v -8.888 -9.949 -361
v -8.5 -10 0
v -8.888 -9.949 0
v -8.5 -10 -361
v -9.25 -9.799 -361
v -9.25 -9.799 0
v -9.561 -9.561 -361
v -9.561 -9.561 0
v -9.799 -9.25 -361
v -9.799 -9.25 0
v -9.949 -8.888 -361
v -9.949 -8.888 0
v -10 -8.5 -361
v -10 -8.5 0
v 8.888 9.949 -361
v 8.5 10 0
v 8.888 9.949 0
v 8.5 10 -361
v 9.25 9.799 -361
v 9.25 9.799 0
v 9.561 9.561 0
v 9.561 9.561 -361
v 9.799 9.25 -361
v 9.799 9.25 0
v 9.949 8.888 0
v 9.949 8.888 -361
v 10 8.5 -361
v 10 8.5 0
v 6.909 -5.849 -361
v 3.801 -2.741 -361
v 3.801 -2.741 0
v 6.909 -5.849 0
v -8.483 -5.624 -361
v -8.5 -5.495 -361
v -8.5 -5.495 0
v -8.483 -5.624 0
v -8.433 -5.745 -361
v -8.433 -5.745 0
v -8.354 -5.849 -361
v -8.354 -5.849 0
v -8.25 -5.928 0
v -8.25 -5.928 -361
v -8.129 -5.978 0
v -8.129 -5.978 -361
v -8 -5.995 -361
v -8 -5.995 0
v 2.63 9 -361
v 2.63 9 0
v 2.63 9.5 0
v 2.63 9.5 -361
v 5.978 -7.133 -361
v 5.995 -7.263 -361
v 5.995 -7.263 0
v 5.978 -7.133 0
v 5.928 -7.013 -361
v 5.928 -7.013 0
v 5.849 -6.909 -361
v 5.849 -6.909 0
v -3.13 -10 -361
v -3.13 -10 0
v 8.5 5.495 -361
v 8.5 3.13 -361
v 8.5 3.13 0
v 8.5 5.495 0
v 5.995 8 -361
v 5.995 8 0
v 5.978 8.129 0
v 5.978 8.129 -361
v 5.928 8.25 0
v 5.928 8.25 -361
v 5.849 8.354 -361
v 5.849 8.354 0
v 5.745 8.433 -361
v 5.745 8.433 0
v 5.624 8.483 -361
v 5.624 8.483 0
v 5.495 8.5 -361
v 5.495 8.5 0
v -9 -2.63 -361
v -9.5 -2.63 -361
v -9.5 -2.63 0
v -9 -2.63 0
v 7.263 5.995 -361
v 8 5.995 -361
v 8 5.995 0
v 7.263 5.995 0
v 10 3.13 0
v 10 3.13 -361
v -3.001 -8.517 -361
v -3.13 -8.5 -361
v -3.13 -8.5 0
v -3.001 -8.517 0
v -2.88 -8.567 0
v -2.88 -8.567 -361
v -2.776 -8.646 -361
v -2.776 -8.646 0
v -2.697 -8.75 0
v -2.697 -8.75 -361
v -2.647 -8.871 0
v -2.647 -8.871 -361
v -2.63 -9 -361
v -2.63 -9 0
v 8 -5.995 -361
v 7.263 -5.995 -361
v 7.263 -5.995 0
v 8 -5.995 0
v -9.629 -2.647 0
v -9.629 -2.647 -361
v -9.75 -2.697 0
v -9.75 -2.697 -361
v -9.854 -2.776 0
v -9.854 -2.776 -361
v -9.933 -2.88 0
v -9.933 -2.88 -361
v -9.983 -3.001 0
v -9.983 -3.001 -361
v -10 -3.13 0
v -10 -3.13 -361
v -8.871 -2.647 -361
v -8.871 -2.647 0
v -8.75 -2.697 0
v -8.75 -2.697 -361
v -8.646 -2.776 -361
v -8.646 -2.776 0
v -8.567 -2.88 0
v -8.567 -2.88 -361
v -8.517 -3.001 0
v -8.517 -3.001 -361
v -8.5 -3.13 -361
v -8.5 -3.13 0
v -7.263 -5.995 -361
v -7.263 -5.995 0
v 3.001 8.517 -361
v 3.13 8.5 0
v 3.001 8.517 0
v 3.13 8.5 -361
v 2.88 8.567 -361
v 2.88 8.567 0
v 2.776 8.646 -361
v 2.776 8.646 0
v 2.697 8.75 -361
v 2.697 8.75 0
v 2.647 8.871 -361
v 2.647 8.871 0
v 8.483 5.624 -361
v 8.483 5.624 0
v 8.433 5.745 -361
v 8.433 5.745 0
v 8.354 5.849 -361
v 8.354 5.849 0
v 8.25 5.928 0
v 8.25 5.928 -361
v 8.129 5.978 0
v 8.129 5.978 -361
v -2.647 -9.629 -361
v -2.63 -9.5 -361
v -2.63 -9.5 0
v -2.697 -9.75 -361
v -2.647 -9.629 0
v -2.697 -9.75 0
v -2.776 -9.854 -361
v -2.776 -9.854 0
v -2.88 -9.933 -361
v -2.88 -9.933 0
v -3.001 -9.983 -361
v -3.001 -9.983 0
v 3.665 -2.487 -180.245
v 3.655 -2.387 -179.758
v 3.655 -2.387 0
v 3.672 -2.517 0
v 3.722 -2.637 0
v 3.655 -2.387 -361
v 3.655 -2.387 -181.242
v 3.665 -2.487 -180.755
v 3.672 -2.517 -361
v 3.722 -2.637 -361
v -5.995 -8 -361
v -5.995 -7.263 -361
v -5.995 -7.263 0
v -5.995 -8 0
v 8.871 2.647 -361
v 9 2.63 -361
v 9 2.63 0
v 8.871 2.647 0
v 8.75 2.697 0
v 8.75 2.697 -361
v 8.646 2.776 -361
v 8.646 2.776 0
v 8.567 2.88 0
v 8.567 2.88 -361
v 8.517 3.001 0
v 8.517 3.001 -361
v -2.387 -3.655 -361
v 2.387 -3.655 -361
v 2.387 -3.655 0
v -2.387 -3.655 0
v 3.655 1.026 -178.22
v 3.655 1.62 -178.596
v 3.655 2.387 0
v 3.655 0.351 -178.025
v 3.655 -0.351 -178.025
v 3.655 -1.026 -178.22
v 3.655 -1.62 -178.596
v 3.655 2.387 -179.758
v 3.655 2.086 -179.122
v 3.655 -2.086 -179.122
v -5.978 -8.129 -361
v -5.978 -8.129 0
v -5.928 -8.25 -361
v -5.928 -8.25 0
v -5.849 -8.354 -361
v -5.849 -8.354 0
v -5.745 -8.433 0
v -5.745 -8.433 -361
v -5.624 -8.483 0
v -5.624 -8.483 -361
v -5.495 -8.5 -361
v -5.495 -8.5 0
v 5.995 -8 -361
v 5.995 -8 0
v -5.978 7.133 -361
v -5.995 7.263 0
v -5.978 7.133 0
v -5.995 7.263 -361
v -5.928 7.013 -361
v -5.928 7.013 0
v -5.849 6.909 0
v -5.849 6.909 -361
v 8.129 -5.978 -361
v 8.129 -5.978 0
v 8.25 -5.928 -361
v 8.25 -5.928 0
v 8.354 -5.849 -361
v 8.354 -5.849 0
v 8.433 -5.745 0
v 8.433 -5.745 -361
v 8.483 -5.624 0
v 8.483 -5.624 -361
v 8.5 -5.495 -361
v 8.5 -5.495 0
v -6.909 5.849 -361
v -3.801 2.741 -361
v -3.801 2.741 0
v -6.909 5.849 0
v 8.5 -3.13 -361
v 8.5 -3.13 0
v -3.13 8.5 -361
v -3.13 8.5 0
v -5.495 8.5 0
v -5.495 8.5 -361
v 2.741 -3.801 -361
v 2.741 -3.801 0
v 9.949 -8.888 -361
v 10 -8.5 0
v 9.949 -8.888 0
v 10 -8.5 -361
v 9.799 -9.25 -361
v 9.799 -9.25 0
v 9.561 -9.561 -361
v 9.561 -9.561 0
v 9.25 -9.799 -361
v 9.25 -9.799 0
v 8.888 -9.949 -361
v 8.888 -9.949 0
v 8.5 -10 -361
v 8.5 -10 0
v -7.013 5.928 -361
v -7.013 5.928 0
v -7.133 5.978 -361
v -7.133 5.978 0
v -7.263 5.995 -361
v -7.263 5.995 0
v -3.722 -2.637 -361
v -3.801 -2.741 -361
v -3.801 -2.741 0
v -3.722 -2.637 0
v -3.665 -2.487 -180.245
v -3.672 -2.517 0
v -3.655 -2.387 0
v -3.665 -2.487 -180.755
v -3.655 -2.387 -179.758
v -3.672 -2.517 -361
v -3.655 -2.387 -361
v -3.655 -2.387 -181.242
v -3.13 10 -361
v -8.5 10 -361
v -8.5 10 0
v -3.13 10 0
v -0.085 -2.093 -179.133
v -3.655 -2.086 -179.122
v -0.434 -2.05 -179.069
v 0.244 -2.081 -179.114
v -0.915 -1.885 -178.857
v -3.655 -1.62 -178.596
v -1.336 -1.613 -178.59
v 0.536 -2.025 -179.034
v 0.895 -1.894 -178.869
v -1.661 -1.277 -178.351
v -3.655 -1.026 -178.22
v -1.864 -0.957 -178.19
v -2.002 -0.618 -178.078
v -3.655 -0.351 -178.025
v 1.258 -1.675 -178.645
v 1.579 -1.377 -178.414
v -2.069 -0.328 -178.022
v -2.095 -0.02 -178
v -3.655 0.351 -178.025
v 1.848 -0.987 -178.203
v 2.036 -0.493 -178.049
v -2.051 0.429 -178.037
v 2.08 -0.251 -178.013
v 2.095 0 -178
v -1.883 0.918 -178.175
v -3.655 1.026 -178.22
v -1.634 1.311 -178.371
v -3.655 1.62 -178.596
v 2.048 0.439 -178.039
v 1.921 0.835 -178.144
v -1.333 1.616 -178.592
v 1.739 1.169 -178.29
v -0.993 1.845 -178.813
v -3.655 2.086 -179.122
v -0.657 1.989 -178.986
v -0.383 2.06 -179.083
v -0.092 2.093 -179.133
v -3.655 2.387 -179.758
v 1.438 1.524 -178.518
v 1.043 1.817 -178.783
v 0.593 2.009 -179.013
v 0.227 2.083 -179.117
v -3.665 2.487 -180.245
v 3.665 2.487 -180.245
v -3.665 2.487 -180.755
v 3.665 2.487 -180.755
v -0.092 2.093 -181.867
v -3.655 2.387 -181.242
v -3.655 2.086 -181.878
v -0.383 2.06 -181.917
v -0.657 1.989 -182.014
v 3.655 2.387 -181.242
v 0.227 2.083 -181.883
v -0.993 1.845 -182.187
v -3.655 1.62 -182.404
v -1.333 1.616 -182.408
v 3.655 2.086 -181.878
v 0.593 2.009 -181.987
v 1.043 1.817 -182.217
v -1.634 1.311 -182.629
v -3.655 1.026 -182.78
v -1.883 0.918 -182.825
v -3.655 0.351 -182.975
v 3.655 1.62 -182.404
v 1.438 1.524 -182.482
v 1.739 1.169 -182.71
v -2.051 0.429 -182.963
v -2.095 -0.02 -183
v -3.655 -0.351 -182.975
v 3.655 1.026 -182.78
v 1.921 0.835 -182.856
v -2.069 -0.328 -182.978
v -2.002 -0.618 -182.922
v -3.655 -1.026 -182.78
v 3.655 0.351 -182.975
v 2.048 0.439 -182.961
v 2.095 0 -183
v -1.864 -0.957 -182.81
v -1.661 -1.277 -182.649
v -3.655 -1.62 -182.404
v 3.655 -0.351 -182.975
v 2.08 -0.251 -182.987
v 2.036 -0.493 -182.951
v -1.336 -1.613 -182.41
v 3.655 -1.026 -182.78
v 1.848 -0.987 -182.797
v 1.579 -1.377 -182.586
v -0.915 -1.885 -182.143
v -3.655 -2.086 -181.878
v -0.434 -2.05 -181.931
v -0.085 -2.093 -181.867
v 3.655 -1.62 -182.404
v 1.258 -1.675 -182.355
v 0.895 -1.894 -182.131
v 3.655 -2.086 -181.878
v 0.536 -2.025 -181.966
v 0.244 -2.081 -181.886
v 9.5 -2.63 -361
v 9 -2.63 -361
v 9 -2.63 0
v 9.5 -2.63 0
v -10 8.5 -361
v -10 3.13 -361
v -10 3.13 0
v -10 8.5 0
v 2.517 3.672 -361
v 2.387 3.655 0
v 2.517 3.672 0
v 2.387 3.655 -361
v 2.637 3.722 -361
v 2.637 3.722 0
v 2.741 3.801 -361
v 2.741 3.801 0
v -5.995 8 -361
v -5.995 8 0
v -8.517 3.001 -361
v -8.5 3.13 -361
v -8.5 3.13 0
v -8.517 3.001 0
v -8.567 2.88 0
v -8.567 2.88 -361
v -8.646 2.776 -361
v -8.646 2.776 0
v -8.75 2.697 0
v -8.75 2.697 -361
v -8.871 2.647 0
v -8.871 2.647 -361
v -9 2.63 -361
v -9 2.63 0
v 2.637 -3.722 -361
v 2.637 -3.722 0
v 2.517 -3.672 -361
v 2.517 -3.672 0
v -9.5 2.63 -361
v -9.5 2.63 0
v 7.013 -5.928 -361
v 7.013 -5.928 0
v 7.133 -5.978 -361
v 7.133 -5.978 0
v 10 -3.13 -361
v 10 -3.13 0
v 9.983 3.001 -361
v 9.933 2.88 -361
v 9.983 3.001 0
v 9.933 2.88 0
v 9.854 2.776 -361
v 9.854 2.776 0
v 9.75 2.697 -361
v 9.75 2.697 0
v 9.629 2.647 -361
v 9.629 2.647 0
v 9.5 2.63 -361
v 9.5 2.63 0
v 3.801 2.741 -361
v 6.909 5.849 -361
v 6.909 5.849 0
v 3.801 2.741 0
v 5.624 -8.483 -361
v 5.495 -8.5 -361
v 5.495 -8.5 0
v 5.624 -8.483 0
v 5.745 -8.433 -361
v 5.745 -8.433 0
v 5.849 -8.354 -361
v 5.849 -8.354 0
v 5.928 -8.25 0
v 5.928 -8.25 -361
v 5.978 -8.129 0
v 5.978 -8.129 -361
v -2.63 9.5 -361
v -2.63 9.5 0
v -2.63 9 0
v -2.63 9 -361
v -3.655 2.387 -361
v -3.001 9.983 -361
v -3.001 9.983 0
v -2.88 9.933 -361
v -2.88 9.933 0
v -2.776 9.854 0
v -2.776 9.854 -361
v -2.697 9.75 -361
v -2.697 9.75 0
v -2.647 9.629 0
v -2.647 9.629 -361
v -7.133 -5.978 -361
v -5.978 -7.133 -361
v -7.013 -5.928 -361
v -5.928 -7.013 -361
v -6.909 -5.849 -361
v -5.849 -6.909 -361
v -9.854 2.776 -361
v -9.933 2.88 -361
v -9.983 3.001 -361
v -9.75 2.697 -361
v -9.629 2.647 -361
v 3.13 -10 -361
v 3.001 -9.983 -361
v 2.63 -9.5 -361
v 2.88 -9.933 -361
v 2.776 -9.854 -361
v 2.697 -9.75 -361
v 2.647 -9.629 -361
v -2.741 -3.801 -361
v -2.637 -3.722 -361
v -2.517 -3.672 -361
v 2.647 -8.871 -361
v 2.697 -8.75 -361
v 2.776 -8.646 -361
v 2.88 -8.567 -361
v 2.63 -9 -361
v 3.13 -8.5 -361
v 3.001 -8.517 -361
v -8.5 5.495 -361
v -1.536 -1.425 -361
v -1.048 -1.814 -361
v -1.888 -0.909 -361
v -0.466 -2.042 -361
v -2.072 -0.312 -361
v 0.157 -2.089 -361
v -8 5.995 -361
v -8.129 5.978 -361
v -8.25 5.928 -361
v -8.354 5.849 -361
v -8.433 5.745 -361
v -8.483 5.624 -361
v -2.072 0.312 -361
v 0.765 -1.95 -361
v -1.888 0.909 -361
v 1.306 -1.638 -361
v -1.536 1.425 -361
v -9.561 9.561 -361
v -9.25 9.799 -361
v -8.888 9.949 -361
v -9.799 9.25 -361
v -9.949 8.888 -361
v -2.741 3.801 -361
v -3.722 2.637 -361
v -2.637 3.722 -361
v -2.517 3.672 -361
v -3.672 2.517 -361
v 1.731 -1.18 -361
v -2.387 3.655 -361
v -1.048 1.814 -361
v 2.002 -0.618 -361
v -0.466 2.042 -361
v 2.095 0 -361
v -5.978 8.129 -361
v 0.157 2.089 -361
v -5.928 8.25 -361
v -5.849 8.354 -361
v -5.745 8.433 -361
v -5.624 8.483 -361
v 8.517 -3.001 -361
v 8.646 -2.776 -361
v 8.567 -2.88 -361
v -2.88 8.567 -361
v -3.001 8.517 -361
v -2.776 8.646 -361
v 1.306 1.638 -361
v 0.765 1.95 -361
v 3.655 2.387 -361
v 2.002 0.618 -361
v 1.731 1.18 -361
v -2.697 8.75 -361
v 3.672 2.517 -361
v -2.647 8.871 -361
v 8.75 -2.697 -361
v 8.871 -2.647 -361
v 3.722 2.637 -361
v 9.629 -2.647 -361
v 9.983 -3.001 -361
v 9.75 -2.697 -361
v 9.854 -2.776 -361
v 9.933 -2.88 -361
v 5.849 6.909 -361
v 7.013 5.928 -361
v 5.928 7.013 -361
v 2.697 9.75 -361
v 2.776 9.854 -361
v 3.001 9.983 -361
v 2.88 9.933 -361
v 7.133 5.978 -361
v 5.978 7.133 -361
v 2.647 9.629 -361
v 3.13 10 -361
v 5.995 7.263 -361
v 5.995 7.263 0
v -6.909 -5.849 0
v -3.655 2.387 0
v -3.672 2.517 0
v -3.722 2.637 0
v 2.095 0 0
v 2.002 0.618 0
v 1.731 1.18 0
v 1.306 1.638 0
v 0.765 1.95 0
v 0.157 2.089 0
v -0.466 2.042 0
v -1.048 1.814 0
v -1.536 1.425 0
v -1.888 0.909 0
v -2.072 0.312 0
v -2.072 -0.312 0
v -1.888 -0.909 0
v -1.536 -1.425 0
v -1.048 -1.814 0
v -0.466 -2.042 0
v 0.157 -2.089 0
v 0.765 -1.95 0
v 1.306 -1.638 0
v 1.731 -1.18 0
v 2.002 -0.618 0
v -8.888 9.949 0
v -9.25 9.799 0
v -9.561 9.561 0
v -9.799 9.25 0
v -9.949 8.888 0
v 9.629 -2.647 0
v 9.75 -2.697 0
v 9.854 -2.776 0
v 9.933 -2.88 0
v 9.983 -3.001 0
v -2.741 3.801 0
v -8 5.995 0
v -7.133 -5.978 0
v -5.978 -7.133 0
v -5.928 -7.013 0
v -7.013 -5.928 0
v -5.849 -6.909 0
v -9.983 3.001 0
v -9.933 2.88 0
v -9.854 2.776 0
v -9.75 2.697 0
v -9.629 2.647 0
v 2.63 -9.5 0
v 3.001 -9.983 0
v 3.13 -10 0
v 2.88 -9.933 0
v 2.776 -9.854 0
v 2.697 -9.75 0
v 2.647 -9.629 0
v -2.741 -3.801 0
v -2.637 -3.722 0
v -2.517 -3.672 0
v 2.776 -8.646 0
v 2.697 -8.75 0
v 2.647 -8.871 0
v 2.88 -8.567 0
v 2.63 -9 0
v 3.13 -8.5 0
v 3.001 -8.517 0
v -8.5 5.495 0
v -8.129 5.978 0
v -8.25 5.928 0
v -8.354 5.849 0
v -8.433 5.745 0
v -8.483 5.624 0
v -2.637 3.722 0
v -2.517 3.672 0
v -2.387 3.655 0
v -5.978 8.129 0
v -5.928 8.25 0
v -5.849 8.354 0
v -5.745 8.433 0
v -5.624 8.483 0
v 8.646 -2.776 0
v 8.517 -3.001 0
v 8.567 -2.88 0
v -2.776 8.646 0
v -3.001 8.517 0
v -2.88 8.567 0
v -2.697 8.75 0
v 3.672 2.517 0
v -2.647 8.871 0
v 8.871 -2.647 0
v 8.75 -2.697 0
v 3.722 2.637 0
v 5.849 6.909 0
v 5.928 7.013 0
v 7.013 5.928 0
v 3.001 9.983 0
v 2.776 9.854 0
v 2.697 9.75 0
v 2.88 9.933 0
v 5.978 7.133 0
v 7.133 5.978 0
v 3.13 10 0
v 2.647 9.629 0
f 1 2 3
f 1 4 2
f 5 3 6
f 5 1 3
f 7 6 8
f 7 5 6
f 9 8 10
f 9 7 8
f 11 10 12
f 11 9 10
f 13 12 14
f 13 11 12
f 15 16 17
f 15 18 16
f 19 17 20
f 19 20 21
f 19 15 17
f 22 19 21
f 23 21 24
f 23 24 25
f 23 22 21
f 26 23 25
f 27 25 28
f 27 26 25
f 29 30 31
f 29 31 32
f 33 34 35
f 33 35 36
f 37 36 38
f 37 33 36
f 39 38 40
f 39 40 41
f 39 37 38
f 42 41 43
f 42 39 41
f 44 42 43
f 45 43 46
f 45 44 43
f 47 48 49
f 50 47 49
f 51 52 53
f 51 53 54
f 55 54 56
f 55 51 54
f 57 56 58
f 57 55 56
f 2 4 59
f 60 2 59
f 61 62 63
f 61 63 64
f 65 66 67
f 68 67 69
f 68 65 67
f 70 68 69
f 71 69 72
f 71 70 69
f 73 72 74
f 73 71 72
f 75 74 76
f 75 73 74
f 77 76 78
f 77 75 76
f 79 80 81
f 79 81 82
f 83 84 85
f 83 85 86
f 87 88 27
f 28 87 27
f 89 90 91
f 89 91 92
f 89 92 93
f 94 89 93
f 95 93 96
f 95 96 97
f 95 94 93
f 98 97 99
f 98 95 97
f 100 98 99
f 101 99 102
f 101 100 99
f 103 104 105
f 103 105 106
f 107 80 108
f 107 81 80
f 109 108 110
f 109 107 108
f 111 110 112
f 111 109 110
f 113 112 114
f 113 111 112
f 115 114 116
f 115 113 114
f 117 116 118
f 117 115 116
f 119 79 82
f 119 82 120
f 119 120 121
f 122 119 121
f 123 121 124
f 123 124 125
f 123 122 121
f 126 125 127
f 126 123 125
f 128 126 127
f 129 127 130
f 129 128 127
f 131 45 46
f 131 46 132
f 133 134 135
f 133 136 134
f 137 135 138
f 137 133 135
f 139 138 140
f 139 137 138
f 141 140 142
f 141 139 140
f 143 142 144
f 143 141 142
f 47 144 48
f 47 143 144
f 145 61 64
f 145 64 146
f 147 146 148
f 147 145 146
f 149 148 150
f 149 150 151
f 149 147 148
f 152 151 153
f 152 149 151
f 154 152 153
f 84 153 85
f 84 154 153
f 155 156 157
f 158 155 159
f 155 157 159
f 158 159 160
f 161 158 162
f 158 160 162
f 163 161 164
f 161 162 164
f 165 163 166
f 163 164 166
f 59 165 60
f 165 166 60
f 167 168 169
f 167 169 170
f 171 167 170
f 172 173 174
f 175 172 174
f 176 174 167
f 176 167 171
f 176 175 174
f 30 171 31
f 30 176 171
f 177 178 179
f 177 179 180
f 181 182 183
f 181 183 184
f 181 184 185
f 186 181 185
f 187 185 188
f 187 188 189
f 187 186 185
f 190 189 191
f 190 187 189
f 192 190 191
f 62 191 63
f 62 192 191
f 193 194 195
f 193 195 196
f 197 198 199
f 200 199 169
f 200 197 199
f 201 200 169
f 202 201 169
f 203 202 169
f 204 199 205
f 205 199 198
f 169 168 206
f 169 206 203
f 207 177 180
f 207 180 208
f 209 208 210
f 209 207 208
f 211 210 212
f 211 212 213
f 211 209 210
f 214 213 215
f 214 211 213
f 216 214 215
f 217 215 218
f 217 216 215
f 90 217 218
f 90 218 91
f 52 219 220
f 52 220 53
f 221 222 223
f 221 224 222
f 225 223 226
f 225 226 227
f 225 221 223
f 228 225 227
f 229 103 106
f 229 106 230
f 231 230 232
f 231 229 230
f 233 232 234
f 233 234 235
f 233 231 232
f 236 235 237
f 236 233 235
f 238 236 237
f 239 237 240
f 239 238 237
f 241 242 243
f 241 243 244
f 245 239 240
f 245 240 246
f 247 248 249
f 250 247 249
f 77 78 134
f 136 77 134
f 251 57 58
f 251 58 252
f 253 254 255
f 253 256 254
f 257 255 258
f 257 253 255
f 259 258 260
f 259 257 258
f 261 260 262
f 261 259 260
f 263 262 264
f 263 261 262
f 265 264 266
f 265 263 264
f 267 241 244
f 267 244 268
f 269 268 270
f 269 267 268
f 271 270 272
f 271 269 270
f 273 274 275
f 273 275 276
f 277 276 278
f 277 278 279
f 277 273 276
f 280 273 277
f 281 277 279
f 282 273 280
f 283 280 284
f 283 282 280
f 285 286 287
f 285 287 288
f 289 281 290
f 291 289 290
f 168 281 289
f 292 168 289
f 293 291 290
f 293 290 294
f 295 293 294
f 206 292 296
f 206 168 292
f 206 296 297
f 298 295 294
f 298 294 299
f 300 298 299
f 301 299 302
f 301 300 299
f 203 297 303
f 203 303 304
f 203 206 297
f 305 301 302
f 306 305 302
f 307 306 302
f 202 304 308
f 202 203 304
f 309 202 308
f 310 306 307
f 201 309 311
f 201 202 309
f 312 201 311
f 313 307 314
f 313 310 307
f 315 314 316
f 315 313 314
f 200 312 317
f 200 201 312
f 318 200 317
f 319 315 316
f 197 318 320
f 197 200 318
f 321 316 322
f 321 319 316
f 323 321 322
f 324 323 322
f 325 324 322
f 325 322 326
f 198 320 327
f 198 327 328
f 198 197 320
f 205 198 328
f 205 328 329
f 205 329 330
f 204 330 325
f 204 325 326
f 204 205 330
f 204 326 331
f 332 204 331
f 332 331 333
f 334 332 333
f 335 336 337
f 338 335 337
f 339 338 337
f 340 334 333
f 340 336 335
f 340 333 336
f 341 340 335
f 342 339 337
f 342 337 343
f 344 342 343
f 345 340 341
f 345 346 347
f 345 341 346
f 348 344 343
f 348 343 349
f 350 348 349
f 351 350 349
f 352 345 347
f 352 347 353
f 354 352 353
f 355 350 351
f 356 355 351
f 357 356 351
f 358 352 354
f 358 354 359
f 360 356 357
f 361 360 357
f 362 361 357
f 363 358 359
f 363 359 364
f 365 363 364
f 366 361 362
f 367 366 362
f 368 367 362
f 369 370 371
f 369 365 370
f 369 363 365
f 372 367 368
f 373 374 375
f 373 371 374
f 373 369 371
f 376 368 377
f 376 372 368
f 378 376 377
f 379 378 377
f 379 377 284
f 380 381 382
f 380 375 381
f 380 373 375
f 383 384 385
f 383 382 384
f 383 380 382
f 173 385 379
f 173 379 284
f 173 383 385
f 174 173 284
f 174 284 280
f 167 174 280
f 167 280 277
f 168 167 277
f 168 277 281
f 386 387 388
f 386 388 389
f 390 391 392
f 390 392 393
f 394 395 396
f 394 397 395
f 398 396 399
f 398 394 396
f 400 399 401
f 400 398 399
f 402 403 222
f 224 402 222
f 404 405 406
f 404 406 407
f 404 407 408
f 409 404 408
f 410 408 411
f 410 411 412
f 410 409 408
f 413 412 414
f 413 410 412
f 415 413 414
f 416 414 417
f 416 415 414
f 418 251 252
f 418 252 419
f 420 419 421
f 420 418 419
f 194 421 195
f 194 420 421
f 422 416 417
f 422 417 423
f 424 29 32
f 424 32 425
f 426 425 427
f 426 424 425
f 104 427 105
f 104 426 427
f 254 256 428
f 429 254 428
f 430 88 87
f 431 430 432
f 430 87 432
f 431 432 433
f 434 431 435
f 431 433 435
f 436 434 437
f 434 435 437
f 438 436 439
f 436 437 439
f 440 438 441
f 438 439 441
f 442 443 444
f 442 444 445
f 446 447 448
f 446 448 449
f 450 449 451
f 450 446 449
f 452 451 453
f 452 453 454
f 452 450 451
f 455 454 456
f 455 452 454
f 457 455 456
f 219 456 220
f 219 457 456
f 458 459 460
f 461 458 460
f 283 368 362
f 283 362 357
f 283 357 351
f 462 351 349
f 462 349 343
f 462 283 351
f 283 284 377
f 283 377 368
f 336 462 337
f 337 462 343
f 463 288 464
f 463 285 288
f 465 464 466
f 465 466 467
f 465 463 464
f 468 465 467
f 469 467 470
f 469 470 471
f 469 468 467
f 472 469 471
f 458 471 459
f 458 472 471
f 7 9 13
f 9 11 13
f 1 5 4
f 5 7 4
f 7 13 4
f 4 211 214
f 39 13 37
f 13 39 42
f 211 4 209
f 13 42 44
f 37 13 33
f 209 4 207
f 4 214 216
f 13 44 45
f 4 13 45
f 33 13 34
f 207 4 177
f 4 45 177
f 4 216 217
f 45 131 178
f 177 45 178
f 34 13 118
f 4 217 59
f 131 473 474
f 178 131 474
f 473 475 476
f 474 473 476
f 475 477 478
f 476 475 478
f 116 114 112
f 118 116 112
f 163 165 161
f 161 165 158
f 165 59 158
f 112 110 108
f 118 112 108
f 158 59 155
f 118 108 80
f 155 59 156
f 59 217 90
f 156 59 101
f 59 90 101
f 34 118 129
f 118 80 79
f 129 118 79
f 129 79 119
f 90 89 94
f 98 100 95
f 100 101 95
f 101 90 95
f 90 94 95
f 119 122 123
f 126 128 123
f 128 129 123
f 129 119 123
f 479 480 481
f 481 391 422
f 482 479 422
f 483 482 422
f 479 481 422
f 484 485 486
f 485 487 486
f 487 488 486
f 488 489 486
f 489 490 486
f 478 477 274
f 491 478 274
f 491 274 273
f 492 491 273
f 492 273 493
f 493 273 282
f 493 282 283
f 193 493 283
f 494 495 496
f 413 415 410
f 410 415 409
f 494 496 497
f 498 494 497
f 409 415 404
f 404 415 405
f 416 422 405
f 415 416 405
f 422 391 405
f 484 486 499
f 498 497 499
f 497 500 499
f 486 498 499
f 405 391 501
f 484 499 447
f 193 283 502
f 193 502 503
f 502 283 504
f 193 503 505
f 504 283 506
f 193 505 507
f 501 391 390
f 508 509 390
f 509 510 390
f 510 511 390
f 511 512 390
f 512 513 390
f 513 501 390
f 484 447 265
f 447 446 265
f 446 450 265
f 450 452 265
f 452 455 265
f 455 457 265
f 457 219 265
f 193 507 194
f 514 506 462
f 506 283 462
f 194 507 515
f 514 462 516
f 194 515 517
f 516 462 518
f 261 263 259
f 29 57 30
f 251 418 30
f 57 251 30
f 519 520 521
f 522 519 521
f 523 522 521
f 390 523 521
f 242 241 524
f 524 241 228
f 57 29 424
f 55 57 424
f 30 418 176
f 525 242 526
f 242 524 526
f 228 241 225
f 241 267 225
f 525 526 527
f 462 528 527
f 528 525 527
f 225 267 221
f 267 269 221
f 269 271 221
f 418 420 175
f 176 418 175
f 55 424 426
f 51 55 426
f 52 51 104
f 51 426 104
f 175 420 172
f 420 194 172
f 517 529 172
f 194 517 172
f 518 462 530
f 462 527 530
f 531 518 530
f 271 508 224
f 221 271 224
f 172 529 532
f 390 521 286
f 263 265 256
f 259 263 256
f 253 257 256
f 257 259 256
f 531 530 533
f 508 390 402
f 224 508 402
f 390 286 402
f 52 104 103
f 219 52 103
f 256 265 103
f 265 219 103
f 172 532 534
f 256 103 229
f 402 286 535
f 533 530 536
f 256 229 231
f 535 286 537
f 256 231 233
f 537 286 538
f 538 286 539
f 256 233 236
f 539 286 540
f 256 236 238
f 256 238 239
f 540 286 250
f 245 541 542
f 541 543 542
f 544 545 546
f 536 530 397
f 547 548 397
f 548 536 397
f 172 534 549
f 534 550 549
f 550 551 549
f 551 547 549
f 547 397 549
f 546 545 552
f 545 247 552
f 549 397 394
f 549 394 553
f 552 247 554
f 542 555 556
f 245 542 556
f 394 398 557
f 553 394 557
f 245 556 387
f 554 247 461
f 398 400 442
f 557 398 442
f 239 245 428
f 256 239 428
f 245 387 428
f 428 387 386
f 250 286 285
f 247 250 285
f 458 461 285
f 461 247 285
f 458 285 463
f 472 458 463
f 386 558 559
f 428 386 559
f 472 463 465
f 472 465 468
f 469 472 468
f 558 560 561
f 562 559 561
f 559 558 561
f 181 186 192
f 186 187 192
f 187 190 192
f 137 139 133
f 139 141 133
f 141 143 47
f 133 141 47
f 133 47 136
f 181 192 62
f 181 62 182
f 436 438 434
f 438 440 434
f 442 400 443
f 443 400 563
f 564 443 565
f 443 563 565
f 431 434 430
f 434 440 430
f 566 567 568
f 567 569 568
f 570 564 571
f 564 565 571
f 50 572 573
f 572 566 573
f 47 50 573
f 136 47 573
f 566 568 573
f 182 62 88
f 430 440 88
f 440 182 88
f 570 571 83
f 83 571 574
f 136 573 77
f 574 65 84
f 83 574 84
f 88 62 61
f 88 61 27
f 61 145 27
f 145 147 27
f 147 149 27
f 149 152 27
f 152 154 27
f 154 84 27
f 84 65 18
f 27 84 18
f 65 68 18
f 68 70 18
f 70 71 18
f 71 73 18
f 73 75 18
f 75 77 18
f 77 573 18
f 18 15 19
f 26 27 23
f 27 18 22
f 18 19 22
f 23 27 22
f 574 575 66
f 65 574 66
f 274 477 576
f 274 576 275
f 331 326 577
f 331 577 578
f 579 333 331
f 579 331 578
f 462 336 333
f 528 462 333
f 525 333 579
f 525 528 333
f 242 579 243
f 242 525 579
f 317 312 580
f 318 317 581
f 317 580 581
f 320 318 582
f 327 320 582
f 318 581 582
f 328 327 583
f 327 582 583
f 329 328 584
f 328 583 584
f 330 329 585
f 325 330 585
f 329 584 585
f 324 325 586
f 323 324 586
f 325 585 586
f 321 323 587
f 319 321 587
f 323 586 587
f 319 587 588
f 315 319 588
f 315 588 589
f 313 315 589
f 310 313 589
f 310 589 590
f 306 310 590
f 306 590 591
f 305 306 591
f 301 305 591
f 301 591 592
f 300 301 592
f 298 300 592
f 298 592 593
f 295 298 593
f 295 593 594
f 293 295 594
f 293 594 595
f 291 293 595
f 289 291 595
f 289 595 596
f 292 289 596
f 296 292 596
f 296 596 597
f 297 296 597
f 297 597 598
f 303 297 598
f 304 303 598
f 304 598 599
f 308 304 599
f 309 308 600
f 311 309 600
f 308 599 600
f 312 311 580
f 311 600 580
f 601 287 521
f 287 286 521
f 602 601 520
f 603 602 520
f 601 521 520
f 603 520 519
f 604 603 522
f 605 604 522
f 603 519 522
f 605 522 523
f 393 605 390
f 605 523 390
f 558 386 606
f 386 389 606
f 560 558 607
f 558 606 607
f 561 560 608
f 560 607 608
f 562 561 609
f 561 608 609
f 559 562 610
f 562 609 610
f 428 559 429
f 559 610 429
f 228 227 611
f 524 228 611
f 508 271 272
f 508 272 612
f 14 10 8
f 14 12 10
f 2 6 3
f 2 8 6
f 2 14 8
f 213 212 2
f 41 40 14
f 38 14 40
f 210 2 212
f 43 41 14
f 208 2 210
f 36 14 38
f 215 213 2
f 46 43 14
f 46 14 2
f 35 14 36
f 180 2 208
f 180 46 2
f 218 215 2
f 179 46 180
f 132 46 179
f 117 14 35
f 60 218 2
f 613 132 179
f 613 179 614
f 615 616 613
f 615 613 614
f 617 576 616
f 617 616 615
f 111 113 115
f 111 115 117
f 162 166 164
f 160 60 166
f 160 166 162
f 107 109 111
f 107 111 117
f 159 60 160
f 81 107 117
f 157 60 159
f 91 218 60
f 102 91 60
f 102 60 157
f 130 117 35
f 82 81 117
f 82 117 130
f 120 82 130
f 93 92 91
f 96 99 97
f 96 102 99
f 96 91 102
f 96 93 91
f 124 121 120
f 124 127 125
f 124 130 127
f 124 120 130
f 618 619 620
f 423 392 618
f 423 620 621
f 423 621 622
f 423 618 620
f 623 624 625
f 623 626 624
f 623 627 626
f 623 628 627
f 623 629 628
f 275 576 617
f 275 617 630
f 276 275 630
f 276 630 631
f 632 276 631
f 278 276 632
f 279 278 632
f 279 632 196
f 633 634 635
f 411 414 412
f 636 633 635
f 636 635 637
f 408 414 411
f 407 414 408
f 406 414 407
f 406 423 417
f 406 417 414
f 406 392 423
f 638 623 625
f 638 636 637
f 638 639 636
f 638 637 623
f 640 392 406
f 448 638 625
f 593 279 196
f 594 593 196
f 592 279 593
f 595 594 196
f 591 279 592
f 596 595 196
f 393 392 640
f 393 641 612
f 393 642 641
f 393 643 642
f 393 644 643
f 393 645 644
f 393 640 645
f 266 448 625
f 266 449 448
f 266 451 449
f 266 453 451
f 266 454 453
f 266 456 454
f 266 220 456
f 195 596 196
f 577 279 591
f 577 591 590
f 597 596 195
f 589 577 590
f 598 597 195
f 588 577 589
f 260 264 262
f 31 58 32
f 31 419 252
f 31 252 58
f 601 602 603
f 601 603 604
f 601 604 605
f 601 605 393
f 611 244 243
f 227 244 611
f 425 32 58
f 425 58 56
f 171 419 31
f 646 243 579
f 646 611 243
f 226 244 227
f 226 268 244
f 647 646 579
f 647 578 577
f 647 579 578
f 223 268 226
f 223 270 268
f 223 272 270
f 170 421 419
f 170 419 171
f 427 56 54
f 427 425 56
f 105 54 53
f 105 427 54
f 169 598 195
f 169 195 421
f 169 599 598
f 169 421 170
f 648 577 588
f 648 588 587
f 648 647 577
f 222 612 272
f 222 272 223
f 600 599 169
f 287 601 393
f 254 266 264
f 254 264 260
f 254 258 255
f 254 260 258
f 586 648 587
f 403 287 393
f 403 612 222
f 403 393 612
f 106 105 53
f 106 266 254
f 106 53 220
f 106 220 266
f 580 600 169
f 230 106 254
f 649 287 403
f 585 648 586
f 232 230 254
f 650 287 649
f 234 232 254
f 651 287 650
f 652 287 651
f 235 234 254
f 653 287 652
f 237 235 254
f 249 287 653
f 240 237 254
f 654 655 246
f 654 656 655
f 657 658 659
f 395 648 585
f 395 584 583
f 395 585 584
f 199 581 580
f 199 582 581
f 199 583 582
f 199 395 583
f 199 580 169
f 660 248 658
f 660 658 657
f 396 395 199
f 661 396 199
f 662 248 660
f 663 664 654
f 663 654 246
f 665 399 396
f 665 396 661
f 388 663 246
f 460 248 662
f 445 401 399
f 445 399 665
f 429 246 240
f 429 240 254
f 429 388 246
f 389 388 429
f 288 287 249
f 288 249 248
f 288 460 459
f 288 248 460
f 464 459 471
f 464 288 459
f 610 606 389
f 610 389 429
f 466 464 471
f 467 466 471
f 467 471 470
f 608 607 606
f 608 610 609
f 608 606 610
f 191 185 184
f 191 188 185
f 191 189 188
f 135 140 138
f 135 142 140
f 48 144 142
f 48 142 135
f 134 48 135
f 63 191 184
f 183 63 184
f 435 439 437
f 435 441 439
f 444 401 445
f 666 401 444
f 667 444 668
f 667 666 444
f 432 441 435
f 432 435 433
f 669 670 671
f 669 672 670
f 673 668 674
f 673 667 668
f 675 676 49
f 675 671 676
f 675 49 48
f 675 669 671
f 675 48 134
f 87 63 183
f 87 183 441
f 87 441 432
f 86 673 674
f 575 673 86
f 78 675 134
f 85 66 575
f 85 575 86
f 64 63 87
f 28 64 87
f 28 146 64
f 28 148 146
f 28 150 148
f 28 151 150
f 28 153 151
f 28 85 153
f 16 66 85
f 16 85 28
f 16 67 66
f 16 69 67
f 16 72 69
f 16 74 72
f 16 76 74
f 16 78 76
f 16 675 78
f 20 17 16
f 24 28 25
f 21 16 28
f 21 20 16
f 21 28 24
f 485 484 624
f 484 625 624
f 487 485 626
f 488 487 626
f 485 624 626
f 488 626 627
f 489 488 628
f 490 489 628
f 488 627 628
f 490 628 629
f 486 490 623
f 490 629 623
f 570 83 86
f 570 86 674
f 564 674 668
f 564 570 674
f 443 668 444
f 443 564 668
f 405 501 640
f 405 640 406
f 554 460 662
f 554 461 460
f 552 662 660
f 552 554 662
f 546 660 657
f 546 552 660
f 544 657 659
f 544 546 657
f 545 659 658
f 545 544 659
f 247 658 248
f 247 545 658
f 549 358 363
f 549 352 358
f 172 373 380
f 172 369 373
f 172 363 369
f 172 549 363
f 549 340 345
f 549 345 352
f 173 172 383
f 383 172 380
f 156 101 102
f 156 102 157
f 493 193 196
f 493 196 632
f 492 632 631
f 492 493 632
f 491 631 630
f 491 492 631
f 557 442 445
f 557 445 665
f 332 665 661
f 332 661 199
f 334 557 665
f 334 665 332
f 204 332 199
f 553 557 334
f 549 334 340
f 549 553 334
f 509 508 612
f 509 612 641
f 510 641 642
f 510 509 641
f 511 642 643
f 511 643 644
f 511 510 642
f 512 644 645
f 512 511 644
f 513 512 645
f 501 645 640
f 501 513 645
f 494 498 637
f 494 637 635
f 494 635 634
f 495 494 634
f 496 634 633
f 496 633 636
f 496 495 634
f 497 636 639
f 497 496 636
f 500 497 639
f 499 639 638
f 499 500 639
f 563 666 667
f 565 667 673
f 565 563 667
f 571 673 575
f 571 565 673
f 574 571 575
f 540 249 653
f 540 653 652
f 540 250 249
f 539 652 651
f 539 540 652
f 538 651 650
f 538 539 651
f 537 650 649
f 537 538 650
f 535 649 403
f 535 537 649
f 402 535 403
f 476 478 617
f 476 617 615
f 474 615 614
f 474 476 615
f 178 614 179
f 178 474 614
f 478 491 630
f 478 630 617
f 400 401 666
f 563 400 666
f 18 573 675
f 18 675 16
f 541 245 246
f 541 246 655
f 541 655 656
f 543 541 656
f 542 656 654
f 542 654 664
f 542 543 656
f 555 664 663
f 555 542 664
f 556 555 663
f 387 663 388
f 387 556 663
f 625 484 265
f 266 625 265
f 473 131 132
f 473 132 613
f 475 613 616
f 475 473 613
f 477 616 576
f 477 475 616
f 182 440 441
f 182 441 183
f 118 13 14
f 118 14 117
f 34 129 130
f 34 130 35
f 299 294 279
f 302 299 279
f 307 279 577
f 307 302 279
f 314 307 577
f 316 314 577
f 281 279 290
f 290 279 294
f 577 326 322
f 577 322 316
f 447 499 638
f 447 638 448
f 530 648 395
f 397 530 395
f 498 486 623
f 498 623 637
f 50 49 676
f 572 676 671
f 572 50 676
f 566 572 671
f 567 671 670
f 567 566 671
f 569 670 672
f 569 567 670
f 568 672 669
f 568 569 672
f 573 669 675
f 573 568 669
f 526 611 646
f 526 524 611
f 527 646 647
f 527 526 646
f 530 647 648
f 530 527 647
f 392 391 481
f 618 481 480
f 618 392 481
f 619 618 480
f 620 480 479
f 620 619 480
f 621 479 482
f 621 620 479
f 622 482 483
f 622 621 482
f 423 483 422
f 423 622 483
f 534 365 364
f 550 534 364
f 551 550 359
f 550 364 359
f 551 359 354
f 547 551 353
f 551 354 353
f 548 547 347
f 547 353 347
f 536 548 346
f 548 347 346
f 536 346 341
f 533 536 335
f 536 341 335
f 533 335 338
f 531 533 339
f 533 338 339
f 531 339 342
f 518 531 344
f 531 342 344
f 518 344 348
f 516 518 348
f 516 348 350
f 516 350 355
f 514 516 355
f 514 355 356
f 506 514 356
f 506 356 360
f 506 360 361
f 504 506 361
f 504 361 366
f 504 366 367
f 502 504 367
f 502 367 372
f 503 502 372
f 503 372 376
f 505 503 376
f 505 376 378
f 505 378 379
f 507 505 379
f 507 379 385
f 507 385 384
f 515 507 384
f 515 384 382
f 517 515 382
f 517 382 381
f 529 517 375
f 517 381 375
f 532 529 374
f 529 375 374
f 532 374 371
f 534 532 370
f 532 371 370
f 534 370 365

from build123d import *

# Parameters (mm, degrees)
SKETCH1_W               = 20
SKETCH1_H               = 20
BOSS_EXTRUDE1_DEPTH     = 361
CUT_EXTRUDE1_DEPTH      = 362.276902112
FILLET1_R               = 0.5
CIRPATTERN1_START       = -361
CIRPATTERN1_DEPTH       = 361
FILLET2_R               = 1.5
SKETCH3_R               = 2.095
CUT_EXTRUDE2_DEPTH      = 362.276902112
FILLET3_R               = 0.5
CUT_EXTRUDE3_DEPTH      = 362.396539863
CUT_EXTRUDE3_DEPTH_BACK = 362.396539863
SKETCH4_R               = 2.5


# Read off the part's stored shape, not the designer's step: CirPattern1
with BuildPart() as part:
    # Sketch1 → Boss-Extrude1 (new body)
    with BuildSketch(Plane.XY):
        Rectangle(SKETCH1_W, SKETCH1_H)
    extrude(amount=-BOSS_EXTRUDE1_DEPTH)

    # Sketch2 → Cut-Extrude1 (cut, through all)
    with BuildSketch(Plane.XY):
        Polygon((0, 10), (-2.63, 10), (-2.63, 8.5), (-5.995, 8.5), (-5.995, 7.055660172), (-2.594339828, 3.655), (2.594339828, 3.655), (5.995, 7.055660172), (5.995, 8.5), (2.63, 8.5), (2.63, 10), align=None)
    extrude(amount=-CUT_EXTRUDE1_DEPTH, mode=Mode.SUBTRACT)

    # Fillet1
    fillet1_edges = [part.edges().sort_by_distance(p)[0] for p in [
        (2.63, 10, -180.5),
        (2.63, 8.5, -180.5),
        (5.995, 8.5, -180.5),
        (5.995, 7.055660172, -180.5),
        (2.594339828, 3.655, -180.5),
        (-2.594339828, 3.655, -180.5),
        (-5.995, 7.055660172, -180.5),
        (-5.995, 8.5, -180.5),
        (-2.63, 8.5, -180.5),
        (-2.63, 10, -180.5),
    ]]
    fillet(fillet1_edges, radius=FILLET1_R)

    # CirPattern1 outline → CirPattern1 (cut)
    with BuildSketch(Plane.XY.offset(CIRPATTERN1_START)):
        with BuildLine():
            Line((-2.63, -10), (2.63, -10))
            Line((2.63, -10), (2.63, -9))
            ThreePointArc((2.63, -9), (2.776446609, -8.646446609), (3.13, -8.5))
            Line((3.13, -8.5), (5.495, -8.5))
            ThreePointArc((5.495, -8.5), (5.848553391, -8.353553391), (5.995, -8))
            Line((5.995, -8), (5.995, -7.262766953))
            ThreePointArc((5.995, -7.262766953), (5.956939766, -7.071425237), (5.848553391, -6.909213562))
            Line((5.848553391, -6.909213562), (2.740786438, -3.801446609))
            ThreePointArc((2.740786438, -3.801446609), (2.578574763, -3.693060234), (2.387233047, -3.655))
            Line((2.387233047, -3.655), (-2.387233047, -3.655))
            ThreePointArc((-2.387233047, -3.655), (-2.578574763, -3.693060234), (-2.740786438, -3.801446609))
            Line((-2.740786438, -3.801446609), (-5.848553391, -6.909213562))
            ThreePointArc((-5.848553391, -6.909213562), (-5.956939766, -7.071425237), (-5.995, -7.262766953))
            Line((-5.995, -7.262766953), (-5.995, -8))
            ThreePointArc((-5.995, -8), (-5.848553391, -8.353553391), (-5.495, -8.5))
            Line((-5.495, -8.5), (-3.13, -8.5))
            ThreePointArc((-3.13, -8.5), (-2.776446609, -8.646446609), (-2.63, -9))
            Line((-2.63, -9), (-2.63, -10))
        make_face()
        with BuildLine():
            Line((-10, 2.63), (-10, -2.63))
            Line((-10, -2.63), (-9, -2.63))
            ThreePointArc((-9, -2.63), (-8.646446609, -2.776446609), (-8.5, -3.13))
            Line((-8.5, -3.13), (-8.5, -5.495))
            ThreePointArc((-8.5, -5.495), (-8.353553391, -5.848553391), (-8, -5.995))
            Line((-8, -5.995), (-7.262766953, -5.995))
            ThreePointArc((-7.262766953, -5.995), (-7.071425237, -5.956939766), (-6.909213562, -5.848553391))
            Line((-6.909213562, -5.848553391), (-3.801446609, -2.740786438))
            ThreePointArc((-3.801446609, -2.740786438), (-3.693060234, -2.578574763), (-3.655, -2.387233047))
            Line((-3.655, -2.387233047), (-3.655, 2.387233047))
            ThreePointArc((-3.655, 2.387233047), (-3.693060234, 2.578574763), (-3.801446609, 2.740786438))
            Line((-3.801446609, 2.740786438), (-6.909213562, 5.848553391))
            ThreePointArc((-6.909213562, 5.848553391), (-7.071425237, 5.956939766), (-7.262766953, 5.995))
            Line((-7.262766953, 5.995), (-8, 5.995))
            ThreePointArc((-8, 5.995), (-8.353553391, 5.848553391), (-8.5, 5.495))
            Line((-8.5, 5.495), (-8.5, 3.13))
            ThreePointArc((-8.5, 3.13), (-8.646446609, 2.776446609), (-9, 2.63))
            Line((-9, 2.63), (-10, 2.63))
        make_face()
        with BuildLine():
            Line((9, -2.63), (10, -2.63))
            Line((10, -2.63), (10, 2.63))
            Line((10, 2.63), (9, 2.63))
            ThreePointArc((9, 2.63), (8.646446609, 2.776446609), (8.5, 3.13))
            Line((8.5, 3.13), (8.5, 5.495))
            ThreePointArc((8.5, 5.495), (8.353553391, 5.848553391), (8, 5.995))
            Line((8, 5.995), (7.262766953, 5.995))
            ThreePointArc((7.262766953, 5.995), (7.071425237, 5.956939766), (6.909213562, 5.848553391))
            Line((6.909213562, 5.848553391), (3.801446609, 2.740786438))
            ThreePointArc((3.801446609, 2.740786438), (3.693060234, 2.578574763), (3.655, 2.387233047))
            Line((3.655, 2.387233047), (3.655, -2.387233047))
            ThreePointArc((3.655, -2.387233047), (3.693060234, -2.578574763), (3.801446609, -2.740786438))
            Line((3.801446609, -2.740786438), (6.909213562, -5.848553391))
            ThreePointArc((6.909213562, -5.848553391), (7.071425237, -5.956939766), (7.262766953, -5.995))
            Line((7.262766953, -5.995), (8, -5.995))
            ThreePointArc((8, -5.995), (8.353553391, -5.848553391), (8.5, -5.495))
            Line((8.5, -5.495), (8.5, -3.13))
            ThreePointArc((8.5, -3.13), (8.646446609, -2.776446609), (9, -2.63))
        make_face()
    extrude(amount=CIRPATTERN1_DEPTH, mode=Mode.SUBTRACT)

    # Fillet2
    fillet2_edges = [part.edges().sort_by_distance(p)[0] for p in [
        (10, -10, -180.5),
        (-10, -10, -180.5),
        (-10, 10, -180.5),
        (10, 10, -180.5),
    ]]
    fillet(fillet2_edges, radius=FILLET2_R)

    # Sketch3 → Cut-Extrude2 (cut, through all)
    with BuildSketch(Plane.XY):
        Circle(SKETCH3_R)
    extrude(amount=-CUT_EXTRUDE2_DEPTH, mode=Mode.SUBTRACT)

    # Fillet3
    fillet3_edges = [part.edges().sort_by_distance(p)[0] for p in [
        (-10, 2.63, -180.5),
        (-10, -2.63, -180.5),
        (-2.63, -10, -180.5),
        (2.63, -10, -180.5),
        (10, -2.63, -180.5),
        (10, 2.63, -180.5),
    ]]
    fillet(fillet3_edges, radius=FILLET3_R)

    # Sketch4 → Cut-Extrude3 (cut, two sides: drawn at the far end of the back side and taken through both)
    with BuildSketch(Plane.ZY.offset(3.655).offset(-CUT_EXTRUDE3_DEPTH_BACK)):
        with Locations(Location((-180.5, 0, 0), (0, 0, 287.274468256))):
            Circle(SKETCH4_R)
    extrude(amount=CUT_EXTRUDE3_DEPTH + CUT_EXTRUDE3_DEPTH_BACK, mode=Mode.SUBTRACT)


solid = part.part
